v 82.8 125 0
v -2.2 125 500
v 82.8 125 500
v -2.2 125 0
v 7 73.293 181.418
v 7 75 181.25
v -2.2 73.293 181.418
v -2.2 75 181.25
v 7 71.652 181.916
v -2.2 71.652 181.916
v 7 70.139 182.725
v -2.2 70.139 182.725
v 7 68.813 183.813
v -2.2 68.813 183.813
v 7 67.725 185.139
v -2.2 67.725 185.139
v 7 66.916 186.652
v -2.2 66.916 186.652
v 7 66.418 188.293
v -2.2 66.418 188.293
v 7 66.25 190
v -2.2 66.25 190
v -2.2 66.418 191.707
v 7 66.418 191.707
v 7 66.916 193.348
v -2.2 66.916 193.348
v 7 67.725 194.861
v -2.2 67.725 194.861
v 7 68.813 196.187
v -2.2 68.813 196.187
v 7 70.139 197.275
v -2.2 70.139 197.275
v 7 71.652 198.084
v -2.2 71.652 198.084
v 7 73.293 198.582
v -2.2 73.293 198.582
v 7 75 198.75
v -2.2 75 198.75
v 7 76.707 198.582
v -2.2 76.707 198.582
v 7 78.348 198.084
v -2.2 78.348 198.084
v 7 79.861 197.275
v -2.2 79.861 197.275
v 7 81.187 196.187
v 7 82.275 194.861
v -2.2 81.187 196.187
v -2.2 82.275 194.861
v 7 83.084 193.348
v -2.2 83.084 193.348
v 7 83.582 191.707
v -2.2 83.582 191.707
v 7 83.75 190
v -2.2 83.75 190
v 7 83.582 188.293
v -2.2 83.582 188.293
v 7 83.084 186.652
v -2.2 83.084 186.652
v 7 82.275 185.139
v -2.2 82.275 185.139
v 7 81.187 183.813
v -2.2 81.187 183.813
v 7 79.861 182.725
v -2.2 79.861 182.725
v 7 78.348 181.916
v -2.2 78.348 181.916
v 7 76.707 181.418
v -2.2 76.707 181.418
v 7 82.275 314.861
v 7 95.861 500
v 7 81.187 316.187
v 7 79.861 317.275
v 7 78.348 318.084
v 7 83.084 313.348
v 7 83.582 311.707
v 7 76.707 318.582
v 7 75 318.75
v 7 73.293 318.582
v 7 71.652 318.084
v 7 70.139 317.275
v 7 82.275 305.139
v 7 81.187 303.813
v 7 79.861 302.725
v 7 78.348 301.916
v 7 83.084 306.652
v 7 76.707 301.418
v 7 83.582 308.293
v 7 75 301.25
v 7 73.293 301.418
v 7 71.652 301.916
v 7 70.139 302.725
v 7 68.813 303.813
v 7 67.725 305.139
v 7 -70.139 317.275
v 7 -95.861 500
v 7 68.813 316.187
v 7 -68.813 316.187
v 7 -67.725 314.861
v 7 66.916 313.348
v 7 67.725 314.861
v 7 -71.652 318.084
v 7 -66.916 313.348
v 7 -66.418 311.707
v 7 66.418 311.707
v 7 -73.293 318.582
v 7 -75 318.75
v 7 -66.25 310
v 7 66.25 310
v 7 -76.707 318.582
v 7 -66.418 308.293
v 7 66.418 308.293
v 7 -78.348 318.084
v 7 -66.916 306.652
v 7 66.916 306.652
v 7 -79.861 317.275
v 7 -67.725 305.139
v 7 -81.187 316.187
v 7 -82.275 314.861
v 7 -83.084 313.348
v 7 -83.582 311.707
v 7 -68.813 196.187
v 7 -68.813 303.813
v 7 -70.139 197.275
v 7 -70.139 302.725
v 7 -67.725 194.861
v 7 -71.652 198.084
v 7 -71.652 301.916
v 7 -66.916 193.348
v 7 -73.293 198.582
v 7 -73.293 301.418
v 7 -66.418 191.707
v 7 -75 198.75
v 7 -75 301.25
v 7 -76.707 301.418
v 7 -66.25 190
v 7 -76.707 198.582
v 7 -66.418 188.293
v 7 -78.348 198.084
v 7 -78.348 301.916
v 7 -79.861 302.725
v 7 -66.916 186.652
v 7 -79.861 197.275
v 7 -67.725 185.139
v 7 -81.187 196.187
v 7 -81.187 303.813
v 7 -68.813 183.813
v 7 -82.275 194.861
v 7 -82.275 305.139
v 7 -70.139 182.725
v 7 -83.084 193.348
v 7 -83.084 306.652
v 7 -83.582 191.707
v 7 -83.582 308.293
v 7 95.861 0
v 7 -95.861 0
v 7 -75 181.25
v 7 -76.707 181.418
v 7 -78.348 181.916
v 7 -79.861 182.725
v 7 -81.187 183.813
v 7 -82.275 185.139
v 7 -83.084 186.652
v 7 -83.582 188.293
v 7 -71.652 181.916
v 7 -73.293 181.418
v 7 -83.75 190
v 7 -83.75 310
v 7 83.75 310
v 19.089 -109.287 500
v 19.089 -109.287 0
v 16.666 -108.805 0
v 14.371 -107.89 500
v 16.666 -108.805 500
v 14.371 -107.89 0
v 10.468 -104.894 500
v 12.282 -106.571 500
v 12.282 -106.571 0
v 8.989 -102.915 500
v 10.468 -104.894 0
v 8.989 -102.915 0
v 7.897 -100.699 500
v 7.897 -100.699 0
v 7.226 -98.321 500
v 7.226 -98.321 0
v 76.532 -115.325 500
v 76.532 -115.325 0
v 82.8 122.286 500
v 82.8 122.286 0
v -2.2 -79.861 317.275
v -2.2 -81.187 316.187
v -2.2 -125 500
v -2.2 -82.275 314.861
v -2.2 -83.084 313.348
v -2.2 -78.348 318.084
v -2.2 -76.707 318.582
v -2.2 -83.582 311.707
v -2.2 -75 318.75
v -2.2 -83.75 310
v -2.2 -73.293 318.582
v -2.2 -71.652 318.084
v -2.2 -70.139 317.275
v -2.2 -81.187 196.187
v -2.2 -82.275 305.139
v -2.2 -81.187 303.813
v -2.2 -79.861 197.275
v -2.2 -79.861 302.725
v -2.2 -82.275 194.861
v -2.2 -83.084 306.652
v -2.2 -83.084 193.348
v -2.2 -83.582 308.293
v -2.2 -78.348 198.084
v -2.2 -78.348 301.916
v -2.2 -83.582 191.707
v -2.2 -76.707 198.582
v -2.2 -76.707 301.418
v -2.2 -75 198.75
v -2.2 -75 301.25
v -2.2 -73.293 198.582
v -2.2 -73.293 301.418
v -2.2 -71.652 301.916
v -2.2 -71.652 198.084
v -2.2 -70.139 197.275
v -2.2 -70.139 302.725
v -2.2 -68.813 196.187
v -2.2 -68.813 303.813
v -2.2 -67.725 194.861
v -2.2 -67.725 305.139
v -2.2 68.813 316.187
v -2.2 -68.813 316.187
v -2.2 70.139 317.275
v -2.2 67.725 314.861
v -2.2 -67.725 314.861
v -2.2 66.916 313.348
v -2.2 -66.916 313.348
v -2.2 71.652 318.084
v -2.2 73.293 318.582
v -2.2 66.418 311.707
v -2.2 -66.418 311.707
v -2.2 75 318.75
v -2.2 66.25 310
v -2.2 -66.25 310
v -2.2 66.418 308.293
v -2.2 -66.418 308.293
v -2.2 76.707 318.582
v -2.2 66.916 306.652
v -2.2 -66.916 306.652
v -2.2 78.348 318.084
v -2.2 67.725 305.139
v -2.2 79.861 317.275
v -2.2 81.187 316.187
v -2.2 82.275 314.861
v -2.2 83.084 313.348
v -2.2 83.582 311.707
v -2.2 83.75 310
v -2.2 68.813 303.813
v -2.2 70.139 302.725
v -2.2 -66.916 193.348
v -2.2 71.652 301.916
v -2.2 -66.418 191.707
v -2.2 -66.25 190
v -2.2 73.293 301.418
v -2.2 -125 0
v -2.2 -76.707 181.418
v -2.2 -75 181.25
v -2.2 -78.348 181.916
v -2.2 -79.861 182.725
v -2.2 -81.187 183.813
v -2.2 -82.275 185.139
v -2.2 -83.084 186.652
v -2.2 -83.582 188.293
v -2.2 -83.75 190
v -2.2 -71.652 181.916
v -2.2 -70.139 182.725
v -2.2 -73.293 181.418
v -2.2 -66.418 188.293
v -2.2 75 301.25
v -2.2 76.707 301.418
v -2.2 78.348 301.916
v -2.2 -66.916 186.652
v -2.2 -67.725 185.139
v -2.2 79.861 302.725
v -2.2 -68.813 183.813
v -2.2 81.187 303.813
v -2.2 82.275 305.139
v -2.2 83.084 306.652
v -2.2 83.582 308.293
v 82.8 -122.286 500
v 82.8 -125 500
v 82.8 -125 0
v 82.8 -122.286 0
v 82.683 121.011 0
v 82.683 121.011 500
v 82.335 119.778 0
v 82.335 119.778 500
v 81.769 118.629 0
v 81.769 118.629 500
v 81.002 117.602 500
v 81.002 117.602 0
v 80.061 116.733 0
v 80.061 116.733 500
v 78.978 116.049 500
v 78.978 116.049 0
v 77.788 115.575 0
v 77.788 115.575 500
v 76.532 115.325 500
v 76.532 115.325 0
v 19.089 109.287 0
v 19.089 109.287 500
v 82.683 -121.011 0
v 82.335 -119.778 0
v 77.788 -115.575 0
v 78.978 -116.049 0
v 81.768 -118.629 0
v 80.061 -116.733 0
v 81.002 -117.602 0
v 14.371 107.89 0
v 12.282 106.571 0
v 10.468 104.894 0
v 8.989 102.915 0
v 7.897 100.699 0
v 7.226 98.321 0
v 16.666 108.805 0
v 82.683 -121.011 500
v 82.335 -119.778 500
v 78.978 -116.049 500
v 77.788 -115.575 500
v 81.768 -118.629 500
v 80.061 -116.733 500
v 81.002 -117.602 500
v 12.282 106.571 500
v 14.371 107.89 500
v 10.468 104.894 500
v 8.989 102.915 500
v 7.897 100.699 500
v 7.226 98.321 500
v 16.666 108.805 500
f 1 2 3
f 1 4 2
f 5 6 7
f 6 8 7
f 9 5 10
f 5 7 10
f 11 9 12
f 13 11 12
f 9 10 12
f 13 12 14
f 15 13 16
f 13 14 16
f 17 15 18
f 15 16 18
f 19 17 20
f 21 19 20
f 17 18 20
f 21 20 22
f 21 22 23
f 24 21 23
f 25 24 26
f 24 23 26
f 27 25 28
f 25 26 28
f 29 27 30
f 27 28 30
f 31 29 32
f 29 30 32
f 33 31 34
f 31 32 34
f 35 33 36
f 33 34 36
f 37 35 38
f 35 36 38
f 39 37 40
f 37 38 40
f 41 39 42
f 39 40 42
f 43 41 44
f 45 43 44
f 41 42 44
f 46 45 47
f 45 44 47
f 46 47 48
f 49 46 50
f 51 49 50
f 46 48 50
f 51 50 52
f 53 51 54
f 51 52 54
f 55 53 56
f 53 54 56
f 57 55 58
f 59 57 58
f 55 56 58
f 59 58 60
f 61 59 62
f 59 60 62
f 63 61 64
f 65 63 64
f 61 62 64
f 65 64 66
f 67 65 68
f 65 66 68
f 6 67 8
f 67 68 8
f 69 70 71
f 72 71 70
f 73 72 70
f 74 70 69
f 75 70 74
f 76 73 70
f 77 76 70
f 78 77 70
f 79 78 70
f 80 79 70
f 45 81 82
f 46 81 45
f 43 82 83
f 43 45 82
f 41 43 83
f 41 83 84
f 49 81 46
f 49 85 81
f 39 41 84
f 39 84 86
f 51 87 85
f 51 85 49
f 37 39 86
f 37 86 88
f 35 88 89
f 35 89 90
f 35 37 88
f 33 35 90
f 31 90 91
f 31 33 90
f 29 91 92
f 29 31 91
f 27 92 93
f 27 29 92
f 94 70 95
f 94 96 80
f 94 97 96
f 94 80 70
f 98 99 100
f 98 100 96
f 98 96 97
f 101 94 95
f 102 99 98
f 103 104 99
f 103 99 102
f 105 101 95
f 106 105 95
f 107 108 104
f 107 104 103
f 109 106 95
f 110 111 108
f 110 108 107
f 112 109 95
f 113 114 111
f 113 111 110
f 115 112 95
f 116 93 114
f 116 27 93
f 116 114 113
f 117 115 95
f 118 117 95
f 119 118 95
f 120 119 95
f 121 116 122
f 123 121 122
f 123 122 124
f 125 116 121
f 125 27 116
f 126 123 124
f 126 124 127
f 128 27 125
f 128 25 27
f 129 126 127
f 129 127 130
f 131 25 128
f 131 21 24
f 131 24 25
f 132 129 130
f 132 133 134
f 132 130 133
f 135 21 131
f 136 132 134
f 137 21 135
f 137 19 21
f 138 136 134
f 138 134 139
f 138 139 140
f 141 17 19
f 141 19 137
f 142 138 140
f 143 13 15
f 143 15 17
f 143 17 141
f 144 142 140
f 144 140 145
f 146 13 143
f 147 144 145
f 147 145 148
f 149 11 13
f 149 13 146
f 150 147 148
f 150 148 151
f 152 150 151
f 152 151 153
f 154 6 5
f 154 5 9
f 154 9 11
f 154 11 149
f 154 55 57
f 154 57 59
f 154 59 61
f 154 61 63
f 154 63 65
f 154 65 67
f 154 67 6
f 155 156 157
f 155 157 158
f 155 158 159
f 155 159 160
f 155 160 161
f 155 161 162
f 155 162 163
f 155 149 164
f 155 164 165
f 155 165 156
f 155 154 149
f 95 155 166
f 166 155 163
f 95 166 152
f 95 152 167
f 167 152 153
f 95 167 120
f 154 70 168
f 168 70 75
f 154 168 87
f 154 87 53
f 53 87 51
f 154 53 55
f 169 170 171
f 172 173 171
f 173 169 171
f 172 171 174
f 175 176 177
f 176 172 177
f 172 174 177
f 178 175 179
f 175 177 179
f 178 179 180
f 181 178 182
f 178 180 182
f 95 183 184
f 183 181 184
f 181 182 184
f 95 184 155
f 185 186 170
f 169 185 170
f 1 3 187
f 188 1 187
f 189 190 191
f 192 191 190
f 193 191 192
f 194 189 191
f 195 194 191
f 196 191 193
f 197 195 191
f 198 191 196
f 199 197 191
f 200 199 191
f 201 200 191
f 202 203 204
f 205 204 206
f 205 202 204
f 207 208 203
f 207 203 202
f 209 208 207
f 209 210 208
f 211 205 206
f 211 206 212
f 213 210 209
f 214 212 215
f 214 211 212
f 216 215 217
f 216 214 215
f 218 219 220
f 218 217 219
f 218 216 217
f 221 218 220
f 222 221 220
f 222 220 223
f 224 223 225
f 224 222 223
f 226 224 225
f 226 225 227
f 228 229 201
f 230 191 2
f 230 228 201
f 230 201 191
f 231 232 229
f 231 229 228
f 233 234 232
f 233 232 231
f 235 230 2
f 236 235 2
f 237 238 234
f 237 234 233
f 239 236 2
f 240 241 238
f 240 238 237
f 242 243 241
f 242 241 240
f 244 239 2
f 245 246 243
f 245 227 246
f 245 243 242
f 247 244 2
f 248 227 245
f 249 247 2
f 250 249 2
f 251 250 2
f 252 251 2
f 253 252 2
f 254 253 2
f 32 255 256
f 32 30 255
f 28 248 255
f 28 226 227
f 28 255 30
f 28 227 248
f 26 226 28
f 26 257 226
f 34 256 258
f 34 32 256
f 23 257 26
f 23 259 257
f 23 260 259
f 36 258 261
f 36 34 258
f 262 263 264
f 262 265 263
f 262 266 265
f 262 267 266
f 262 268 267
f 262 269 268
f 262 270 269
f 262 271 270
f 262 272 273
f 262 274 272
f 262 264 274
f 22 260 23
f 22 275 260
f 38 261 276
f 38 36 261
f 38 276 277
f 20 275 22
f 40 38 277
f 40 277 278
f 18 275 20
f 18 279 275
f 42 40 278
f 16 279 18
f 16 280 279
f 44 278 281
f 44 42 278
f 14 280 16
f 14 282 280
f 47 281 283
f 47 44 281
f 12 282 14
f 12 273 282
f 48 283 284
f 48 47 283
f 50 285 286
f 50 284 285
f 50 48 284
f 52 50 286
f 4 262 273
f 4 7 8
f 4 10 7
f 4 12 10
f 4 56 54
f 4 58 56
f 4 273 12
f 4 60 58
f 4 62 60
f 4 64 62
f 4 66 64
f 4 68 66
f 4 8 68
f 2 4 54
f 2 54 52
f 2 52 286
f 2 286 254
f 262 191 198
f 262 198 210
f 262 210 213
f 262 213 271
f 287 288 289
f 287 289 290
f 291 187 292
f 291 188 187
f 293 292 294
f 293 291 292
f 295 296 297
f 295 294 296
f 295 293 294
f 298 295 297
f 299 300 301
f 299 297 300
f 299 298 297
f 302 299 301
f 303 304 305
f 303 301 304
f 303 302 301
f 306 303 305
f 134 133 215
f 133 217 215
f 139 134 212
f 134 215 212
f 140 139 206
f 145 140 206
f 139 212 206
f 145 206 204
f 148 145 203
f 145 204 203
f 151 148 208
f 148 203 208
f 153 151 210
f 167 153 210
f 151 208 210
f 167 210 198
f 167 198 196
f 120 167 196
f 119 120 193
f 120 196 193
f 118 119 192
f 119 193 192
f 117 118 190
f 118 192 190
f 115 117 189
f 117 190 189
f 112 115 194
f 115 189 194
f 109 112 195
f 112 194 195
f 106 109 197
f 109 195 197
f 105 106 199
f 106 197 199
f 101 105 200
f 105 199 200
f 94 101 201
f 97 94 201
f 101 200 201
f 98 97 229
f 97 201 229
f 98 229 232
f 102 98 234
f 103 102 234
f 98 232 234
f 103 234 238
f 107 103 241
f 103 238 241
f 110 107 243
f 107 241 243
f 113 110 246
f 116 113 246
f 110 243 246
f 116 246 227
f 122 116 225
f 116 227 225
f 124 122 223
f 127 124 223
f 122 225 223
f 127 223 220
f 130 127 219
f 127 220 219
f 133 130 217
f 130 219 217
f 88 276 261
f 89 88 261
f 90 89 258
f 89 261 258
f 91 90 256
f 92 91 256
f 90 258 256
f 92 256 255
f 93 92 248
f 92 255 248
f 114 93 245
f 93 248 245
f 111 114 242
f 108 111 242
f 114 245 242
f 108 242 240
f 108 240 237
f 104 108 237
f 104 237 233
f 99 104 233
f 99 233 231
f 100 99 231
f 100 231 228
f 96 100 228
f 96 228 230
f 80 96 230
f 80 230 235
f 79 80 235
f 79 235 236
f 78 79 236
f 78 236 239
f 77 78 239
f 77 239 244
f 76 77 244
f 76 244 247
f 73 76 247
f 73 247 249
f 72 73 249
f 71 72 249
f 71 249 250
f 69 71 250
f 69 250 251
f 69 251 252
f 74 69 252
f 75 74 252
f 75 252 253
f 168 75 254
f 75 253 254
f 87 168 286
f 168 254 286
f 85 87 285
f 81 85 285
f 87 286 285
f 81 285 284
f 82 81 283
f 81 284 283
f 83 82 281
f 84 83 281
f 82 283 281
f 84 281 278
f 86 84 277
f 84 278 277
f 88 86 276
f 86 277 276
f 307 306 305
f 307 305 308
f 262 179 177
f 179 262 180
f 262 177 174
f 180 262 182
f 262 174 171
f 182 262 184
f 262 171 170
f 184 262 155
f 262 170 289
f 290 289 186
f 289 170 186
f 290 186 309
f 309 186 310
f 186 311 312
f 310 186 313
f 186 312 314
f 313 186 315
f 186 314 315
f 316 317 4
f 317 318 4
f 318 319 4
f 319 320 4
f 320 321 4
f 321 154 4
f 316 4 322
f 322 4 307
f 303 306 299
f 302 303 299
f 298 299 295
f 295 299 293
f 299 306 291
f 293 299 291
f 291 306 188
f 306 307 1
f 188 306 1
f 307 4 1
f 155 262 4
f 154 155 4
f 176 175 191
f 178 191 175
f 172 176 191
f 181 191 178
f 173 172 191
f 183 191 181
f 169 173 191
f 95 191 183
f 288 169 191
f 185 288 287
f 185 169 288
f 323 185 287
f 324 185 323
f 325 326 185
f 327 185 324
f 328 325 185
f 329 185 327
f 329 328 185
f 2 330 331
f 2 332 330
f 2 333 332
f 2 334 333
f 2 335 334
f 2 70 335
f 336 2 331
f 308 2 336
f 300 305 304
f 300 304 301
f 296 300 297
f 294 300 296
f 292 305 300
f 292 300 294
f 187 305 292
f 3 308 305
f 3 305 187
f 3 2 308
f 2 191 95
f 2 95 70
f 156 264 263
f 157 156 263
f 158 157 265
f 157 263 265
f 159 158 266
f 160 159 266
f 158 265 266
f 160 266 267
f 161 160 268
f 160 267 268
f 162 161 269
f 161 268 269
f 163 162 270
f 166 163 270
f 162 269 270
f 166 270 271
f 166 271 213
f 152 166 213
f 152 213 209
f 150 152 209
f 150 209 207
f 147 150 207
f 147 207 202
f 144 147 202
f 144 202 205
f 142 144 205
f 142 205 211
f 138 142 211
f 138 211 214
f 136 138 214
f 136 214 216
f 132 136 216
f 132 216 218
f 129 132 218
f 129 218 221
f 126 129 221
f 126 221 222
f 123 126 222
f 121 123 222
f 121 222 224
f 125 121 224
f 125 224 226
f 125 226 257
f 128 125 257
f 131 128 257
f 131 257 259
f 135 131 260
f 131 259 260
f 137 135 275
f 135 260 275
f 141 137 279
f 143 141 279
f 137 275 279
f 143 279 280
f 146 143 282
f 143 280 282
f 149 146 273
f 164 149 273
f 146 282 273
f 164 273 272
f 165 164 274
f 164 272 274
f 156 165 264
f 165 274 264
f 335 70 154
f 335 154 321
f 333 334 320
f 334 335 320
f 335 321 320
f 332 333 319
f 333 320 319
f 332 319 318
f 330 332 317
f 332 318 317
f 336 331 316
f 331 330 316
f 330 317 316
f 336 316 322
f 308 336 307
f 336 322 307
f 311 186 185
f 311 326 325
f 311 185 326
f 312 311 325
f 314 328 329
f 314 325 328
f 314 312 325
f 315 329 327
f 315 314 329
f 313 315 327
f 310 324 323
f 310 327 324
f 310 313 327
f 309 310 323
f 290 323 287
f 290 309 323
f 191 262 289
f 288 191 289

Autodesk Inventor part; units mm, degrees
ref_plane "YZ Plane" through (0, 0, 0) normal (1, 0, 0) x (0, 1, 0)
ref_plane "Start Plane" through (0, 0, 0) normal (0, 0, 1) x (1, 0, 0)
ref_plane "End Plane" through (0, 0, 500) normal (0, 0, 1) x (1, 0, 0)
sketch "Sketch" plane through (0, 0, 0) normal (0, 0, 1) x (1, 0, 0)
  line L0 (-2.2, 0) -> (-2.2, 125)
  line L1 (-2.2, 125) -> (82.8, 125)
  line L2 (82.8, 125) -> (82.8, 122.2863)
  line L3 (76.5317, 115.3246) -> (19.0889, 109.2871)
  line L4 (7, 95.8611) -> (7, 0)
  line L5 (7, 0) -> (-2.2, 0) construction
  line L6 (44.9, 125) -> (44.9, 112) construction
  line L7 (82.8, 115.9834) -> (82.8, 112) construction
  line L8 (82.8, 112) -> (44.9, 112) construction
  line L9 (0, 15) -> (0, -27) construction
  line L10 (-5.539, 0) -> (16.0067, 0) construction
  line L11 (-2.2, 0) -> (-2.2, -125)
  line L12 (-2.2, -125) -> (82.8, -125)
  line L13 (82.8, -125) -> (82.8, -122.2863)
  line L14 (76.5317, -115.3246) -> (19.0889, -109.2871)
  line L15 (7, -95.8611) -> (7, 0)
  arc A0 (19.0889, 109.2871) -> (7, 95.8611) centre (20.5, 95.8611) ccw
  arc A1 (7, -95.8611) -> (19.0889, -109.2871) centre (20.5, -95.8611) ccw
  arc A2 (76.5317, 115.3246) -> (82.8, 122.2863) centre (75.8, 122.2863) ccw
  arc A3 (82.8, -122.2863) -> (76.5317, -115.3246) centre (75.8, -122.2863) ccw
  line L16 (0, 175) -> (0, -175) construction
  line L17 (-23.474, 0) -> (102.0712, 0) construction
  point P0 (7, 108.0166)
  point P1 (82.8, -115.9834)
  point P2 (7, -108.0166)
  point P3 (44.9, -125)
  point P4 (44.9, -112)
  dimension "d0" = 9.2
  dimension "d1" = 125
  dimension "d2" = 85
  dimension "d3" = 13
  dimension "d4" = 37.9
  dimension "d5" = 3.9834
  dimension "d23" = 13.5
  dimension "d24" = 7
  dimension "d25" = 2.2
extrude "Body" add sketch "Sketch" along normal up to surface (500 mm away) from surface at 0
sketch "Sketch3" plane through (0, 0, 0) normal (0, 0, 1) x (1, 0, 0)
  line L0 (0, 0) -> (10, 0)
ref_plane "Work Plane3" through (0, 0, 0) normal (0, -1, 0) x (1, 0, 0)
sketch "Sketch5" plane through (7, -95.8611, 500) normal (1, 0, 0) x (0, 0, -1)
  point P0 (190, 170.8611)
hole "Hole1" at (7, 75, 310) direction (-1, 0, 0) diameter 17.5 end through all
sketch "Sketch6" plane through (7, -95.8611, 500) normal (1, 0, 0) x (0, 0, -1)
  point P0 (310, 170.8611)
hole "Hole2" at (7, 75, 190) direction (-1, 0, 0) diameter 17.5 end through all
sketch "Sketch7" plane through (7, -95.8611, 500) normal (1, 0, 0) x (0, 0, -1)
  point P0 (190, 20.8611)
hole "Hole3" at (7, -75, 310) direction (-1, 0, 0) diameter 17.5 end through all
sketch "Sketch8" plane through (7, -95.8611, 500) normal (1, 0, 0) x (0, 0, -1)
  point P0 (310, 20.8611)
hole "Hole4" at (7, -75, 190) direction (-1, 0, 0) diameter 17.5 end through all
sketch "Sketch4" plane through (0, 0, 0) normal (0, -1, 0) x (1, 0, 0)
  line L0 (-2, 0) -> (12, 0) projected
  line L1 (-2, 500) -> (12, 500) projected
  dimension "d29" = 500
equation "\"d0\" = G_T"
equation "\"d1\" = 0.5 * G_H"
equation "\"d2\" = G_W"
equation "\"d3\" = G_T1"
equation "\"d4\" = G_C"
equation "\"d23\" = G_IR"
equation "\"d24\" = G_ER"
equation "\"d25\" = ex"
equation "\"d6\" = G_L"
equation "\"G_W\" = 85"
equation "\"G_H\" = 250"
equation "\"G_T\" = 9.2"
equation "\"G_T1\" = 13"
equation "\"G_NG\" = 0.105104"
equation "\"G_ER\" = 7"
equation "\"G_IR\" = 13.5"
equation "\"G_C\" = 37.9"
equation "\"G_L\" = d29"
equation "\"ex\" = 2.2"
equation "\"G_OFFSET_START\" = 0"
equation "\"G_OFFSET_END\" = 0"
properties part number "ISO 657/11 - CH 250 x 34 - 500" material "Steel, Mild"
